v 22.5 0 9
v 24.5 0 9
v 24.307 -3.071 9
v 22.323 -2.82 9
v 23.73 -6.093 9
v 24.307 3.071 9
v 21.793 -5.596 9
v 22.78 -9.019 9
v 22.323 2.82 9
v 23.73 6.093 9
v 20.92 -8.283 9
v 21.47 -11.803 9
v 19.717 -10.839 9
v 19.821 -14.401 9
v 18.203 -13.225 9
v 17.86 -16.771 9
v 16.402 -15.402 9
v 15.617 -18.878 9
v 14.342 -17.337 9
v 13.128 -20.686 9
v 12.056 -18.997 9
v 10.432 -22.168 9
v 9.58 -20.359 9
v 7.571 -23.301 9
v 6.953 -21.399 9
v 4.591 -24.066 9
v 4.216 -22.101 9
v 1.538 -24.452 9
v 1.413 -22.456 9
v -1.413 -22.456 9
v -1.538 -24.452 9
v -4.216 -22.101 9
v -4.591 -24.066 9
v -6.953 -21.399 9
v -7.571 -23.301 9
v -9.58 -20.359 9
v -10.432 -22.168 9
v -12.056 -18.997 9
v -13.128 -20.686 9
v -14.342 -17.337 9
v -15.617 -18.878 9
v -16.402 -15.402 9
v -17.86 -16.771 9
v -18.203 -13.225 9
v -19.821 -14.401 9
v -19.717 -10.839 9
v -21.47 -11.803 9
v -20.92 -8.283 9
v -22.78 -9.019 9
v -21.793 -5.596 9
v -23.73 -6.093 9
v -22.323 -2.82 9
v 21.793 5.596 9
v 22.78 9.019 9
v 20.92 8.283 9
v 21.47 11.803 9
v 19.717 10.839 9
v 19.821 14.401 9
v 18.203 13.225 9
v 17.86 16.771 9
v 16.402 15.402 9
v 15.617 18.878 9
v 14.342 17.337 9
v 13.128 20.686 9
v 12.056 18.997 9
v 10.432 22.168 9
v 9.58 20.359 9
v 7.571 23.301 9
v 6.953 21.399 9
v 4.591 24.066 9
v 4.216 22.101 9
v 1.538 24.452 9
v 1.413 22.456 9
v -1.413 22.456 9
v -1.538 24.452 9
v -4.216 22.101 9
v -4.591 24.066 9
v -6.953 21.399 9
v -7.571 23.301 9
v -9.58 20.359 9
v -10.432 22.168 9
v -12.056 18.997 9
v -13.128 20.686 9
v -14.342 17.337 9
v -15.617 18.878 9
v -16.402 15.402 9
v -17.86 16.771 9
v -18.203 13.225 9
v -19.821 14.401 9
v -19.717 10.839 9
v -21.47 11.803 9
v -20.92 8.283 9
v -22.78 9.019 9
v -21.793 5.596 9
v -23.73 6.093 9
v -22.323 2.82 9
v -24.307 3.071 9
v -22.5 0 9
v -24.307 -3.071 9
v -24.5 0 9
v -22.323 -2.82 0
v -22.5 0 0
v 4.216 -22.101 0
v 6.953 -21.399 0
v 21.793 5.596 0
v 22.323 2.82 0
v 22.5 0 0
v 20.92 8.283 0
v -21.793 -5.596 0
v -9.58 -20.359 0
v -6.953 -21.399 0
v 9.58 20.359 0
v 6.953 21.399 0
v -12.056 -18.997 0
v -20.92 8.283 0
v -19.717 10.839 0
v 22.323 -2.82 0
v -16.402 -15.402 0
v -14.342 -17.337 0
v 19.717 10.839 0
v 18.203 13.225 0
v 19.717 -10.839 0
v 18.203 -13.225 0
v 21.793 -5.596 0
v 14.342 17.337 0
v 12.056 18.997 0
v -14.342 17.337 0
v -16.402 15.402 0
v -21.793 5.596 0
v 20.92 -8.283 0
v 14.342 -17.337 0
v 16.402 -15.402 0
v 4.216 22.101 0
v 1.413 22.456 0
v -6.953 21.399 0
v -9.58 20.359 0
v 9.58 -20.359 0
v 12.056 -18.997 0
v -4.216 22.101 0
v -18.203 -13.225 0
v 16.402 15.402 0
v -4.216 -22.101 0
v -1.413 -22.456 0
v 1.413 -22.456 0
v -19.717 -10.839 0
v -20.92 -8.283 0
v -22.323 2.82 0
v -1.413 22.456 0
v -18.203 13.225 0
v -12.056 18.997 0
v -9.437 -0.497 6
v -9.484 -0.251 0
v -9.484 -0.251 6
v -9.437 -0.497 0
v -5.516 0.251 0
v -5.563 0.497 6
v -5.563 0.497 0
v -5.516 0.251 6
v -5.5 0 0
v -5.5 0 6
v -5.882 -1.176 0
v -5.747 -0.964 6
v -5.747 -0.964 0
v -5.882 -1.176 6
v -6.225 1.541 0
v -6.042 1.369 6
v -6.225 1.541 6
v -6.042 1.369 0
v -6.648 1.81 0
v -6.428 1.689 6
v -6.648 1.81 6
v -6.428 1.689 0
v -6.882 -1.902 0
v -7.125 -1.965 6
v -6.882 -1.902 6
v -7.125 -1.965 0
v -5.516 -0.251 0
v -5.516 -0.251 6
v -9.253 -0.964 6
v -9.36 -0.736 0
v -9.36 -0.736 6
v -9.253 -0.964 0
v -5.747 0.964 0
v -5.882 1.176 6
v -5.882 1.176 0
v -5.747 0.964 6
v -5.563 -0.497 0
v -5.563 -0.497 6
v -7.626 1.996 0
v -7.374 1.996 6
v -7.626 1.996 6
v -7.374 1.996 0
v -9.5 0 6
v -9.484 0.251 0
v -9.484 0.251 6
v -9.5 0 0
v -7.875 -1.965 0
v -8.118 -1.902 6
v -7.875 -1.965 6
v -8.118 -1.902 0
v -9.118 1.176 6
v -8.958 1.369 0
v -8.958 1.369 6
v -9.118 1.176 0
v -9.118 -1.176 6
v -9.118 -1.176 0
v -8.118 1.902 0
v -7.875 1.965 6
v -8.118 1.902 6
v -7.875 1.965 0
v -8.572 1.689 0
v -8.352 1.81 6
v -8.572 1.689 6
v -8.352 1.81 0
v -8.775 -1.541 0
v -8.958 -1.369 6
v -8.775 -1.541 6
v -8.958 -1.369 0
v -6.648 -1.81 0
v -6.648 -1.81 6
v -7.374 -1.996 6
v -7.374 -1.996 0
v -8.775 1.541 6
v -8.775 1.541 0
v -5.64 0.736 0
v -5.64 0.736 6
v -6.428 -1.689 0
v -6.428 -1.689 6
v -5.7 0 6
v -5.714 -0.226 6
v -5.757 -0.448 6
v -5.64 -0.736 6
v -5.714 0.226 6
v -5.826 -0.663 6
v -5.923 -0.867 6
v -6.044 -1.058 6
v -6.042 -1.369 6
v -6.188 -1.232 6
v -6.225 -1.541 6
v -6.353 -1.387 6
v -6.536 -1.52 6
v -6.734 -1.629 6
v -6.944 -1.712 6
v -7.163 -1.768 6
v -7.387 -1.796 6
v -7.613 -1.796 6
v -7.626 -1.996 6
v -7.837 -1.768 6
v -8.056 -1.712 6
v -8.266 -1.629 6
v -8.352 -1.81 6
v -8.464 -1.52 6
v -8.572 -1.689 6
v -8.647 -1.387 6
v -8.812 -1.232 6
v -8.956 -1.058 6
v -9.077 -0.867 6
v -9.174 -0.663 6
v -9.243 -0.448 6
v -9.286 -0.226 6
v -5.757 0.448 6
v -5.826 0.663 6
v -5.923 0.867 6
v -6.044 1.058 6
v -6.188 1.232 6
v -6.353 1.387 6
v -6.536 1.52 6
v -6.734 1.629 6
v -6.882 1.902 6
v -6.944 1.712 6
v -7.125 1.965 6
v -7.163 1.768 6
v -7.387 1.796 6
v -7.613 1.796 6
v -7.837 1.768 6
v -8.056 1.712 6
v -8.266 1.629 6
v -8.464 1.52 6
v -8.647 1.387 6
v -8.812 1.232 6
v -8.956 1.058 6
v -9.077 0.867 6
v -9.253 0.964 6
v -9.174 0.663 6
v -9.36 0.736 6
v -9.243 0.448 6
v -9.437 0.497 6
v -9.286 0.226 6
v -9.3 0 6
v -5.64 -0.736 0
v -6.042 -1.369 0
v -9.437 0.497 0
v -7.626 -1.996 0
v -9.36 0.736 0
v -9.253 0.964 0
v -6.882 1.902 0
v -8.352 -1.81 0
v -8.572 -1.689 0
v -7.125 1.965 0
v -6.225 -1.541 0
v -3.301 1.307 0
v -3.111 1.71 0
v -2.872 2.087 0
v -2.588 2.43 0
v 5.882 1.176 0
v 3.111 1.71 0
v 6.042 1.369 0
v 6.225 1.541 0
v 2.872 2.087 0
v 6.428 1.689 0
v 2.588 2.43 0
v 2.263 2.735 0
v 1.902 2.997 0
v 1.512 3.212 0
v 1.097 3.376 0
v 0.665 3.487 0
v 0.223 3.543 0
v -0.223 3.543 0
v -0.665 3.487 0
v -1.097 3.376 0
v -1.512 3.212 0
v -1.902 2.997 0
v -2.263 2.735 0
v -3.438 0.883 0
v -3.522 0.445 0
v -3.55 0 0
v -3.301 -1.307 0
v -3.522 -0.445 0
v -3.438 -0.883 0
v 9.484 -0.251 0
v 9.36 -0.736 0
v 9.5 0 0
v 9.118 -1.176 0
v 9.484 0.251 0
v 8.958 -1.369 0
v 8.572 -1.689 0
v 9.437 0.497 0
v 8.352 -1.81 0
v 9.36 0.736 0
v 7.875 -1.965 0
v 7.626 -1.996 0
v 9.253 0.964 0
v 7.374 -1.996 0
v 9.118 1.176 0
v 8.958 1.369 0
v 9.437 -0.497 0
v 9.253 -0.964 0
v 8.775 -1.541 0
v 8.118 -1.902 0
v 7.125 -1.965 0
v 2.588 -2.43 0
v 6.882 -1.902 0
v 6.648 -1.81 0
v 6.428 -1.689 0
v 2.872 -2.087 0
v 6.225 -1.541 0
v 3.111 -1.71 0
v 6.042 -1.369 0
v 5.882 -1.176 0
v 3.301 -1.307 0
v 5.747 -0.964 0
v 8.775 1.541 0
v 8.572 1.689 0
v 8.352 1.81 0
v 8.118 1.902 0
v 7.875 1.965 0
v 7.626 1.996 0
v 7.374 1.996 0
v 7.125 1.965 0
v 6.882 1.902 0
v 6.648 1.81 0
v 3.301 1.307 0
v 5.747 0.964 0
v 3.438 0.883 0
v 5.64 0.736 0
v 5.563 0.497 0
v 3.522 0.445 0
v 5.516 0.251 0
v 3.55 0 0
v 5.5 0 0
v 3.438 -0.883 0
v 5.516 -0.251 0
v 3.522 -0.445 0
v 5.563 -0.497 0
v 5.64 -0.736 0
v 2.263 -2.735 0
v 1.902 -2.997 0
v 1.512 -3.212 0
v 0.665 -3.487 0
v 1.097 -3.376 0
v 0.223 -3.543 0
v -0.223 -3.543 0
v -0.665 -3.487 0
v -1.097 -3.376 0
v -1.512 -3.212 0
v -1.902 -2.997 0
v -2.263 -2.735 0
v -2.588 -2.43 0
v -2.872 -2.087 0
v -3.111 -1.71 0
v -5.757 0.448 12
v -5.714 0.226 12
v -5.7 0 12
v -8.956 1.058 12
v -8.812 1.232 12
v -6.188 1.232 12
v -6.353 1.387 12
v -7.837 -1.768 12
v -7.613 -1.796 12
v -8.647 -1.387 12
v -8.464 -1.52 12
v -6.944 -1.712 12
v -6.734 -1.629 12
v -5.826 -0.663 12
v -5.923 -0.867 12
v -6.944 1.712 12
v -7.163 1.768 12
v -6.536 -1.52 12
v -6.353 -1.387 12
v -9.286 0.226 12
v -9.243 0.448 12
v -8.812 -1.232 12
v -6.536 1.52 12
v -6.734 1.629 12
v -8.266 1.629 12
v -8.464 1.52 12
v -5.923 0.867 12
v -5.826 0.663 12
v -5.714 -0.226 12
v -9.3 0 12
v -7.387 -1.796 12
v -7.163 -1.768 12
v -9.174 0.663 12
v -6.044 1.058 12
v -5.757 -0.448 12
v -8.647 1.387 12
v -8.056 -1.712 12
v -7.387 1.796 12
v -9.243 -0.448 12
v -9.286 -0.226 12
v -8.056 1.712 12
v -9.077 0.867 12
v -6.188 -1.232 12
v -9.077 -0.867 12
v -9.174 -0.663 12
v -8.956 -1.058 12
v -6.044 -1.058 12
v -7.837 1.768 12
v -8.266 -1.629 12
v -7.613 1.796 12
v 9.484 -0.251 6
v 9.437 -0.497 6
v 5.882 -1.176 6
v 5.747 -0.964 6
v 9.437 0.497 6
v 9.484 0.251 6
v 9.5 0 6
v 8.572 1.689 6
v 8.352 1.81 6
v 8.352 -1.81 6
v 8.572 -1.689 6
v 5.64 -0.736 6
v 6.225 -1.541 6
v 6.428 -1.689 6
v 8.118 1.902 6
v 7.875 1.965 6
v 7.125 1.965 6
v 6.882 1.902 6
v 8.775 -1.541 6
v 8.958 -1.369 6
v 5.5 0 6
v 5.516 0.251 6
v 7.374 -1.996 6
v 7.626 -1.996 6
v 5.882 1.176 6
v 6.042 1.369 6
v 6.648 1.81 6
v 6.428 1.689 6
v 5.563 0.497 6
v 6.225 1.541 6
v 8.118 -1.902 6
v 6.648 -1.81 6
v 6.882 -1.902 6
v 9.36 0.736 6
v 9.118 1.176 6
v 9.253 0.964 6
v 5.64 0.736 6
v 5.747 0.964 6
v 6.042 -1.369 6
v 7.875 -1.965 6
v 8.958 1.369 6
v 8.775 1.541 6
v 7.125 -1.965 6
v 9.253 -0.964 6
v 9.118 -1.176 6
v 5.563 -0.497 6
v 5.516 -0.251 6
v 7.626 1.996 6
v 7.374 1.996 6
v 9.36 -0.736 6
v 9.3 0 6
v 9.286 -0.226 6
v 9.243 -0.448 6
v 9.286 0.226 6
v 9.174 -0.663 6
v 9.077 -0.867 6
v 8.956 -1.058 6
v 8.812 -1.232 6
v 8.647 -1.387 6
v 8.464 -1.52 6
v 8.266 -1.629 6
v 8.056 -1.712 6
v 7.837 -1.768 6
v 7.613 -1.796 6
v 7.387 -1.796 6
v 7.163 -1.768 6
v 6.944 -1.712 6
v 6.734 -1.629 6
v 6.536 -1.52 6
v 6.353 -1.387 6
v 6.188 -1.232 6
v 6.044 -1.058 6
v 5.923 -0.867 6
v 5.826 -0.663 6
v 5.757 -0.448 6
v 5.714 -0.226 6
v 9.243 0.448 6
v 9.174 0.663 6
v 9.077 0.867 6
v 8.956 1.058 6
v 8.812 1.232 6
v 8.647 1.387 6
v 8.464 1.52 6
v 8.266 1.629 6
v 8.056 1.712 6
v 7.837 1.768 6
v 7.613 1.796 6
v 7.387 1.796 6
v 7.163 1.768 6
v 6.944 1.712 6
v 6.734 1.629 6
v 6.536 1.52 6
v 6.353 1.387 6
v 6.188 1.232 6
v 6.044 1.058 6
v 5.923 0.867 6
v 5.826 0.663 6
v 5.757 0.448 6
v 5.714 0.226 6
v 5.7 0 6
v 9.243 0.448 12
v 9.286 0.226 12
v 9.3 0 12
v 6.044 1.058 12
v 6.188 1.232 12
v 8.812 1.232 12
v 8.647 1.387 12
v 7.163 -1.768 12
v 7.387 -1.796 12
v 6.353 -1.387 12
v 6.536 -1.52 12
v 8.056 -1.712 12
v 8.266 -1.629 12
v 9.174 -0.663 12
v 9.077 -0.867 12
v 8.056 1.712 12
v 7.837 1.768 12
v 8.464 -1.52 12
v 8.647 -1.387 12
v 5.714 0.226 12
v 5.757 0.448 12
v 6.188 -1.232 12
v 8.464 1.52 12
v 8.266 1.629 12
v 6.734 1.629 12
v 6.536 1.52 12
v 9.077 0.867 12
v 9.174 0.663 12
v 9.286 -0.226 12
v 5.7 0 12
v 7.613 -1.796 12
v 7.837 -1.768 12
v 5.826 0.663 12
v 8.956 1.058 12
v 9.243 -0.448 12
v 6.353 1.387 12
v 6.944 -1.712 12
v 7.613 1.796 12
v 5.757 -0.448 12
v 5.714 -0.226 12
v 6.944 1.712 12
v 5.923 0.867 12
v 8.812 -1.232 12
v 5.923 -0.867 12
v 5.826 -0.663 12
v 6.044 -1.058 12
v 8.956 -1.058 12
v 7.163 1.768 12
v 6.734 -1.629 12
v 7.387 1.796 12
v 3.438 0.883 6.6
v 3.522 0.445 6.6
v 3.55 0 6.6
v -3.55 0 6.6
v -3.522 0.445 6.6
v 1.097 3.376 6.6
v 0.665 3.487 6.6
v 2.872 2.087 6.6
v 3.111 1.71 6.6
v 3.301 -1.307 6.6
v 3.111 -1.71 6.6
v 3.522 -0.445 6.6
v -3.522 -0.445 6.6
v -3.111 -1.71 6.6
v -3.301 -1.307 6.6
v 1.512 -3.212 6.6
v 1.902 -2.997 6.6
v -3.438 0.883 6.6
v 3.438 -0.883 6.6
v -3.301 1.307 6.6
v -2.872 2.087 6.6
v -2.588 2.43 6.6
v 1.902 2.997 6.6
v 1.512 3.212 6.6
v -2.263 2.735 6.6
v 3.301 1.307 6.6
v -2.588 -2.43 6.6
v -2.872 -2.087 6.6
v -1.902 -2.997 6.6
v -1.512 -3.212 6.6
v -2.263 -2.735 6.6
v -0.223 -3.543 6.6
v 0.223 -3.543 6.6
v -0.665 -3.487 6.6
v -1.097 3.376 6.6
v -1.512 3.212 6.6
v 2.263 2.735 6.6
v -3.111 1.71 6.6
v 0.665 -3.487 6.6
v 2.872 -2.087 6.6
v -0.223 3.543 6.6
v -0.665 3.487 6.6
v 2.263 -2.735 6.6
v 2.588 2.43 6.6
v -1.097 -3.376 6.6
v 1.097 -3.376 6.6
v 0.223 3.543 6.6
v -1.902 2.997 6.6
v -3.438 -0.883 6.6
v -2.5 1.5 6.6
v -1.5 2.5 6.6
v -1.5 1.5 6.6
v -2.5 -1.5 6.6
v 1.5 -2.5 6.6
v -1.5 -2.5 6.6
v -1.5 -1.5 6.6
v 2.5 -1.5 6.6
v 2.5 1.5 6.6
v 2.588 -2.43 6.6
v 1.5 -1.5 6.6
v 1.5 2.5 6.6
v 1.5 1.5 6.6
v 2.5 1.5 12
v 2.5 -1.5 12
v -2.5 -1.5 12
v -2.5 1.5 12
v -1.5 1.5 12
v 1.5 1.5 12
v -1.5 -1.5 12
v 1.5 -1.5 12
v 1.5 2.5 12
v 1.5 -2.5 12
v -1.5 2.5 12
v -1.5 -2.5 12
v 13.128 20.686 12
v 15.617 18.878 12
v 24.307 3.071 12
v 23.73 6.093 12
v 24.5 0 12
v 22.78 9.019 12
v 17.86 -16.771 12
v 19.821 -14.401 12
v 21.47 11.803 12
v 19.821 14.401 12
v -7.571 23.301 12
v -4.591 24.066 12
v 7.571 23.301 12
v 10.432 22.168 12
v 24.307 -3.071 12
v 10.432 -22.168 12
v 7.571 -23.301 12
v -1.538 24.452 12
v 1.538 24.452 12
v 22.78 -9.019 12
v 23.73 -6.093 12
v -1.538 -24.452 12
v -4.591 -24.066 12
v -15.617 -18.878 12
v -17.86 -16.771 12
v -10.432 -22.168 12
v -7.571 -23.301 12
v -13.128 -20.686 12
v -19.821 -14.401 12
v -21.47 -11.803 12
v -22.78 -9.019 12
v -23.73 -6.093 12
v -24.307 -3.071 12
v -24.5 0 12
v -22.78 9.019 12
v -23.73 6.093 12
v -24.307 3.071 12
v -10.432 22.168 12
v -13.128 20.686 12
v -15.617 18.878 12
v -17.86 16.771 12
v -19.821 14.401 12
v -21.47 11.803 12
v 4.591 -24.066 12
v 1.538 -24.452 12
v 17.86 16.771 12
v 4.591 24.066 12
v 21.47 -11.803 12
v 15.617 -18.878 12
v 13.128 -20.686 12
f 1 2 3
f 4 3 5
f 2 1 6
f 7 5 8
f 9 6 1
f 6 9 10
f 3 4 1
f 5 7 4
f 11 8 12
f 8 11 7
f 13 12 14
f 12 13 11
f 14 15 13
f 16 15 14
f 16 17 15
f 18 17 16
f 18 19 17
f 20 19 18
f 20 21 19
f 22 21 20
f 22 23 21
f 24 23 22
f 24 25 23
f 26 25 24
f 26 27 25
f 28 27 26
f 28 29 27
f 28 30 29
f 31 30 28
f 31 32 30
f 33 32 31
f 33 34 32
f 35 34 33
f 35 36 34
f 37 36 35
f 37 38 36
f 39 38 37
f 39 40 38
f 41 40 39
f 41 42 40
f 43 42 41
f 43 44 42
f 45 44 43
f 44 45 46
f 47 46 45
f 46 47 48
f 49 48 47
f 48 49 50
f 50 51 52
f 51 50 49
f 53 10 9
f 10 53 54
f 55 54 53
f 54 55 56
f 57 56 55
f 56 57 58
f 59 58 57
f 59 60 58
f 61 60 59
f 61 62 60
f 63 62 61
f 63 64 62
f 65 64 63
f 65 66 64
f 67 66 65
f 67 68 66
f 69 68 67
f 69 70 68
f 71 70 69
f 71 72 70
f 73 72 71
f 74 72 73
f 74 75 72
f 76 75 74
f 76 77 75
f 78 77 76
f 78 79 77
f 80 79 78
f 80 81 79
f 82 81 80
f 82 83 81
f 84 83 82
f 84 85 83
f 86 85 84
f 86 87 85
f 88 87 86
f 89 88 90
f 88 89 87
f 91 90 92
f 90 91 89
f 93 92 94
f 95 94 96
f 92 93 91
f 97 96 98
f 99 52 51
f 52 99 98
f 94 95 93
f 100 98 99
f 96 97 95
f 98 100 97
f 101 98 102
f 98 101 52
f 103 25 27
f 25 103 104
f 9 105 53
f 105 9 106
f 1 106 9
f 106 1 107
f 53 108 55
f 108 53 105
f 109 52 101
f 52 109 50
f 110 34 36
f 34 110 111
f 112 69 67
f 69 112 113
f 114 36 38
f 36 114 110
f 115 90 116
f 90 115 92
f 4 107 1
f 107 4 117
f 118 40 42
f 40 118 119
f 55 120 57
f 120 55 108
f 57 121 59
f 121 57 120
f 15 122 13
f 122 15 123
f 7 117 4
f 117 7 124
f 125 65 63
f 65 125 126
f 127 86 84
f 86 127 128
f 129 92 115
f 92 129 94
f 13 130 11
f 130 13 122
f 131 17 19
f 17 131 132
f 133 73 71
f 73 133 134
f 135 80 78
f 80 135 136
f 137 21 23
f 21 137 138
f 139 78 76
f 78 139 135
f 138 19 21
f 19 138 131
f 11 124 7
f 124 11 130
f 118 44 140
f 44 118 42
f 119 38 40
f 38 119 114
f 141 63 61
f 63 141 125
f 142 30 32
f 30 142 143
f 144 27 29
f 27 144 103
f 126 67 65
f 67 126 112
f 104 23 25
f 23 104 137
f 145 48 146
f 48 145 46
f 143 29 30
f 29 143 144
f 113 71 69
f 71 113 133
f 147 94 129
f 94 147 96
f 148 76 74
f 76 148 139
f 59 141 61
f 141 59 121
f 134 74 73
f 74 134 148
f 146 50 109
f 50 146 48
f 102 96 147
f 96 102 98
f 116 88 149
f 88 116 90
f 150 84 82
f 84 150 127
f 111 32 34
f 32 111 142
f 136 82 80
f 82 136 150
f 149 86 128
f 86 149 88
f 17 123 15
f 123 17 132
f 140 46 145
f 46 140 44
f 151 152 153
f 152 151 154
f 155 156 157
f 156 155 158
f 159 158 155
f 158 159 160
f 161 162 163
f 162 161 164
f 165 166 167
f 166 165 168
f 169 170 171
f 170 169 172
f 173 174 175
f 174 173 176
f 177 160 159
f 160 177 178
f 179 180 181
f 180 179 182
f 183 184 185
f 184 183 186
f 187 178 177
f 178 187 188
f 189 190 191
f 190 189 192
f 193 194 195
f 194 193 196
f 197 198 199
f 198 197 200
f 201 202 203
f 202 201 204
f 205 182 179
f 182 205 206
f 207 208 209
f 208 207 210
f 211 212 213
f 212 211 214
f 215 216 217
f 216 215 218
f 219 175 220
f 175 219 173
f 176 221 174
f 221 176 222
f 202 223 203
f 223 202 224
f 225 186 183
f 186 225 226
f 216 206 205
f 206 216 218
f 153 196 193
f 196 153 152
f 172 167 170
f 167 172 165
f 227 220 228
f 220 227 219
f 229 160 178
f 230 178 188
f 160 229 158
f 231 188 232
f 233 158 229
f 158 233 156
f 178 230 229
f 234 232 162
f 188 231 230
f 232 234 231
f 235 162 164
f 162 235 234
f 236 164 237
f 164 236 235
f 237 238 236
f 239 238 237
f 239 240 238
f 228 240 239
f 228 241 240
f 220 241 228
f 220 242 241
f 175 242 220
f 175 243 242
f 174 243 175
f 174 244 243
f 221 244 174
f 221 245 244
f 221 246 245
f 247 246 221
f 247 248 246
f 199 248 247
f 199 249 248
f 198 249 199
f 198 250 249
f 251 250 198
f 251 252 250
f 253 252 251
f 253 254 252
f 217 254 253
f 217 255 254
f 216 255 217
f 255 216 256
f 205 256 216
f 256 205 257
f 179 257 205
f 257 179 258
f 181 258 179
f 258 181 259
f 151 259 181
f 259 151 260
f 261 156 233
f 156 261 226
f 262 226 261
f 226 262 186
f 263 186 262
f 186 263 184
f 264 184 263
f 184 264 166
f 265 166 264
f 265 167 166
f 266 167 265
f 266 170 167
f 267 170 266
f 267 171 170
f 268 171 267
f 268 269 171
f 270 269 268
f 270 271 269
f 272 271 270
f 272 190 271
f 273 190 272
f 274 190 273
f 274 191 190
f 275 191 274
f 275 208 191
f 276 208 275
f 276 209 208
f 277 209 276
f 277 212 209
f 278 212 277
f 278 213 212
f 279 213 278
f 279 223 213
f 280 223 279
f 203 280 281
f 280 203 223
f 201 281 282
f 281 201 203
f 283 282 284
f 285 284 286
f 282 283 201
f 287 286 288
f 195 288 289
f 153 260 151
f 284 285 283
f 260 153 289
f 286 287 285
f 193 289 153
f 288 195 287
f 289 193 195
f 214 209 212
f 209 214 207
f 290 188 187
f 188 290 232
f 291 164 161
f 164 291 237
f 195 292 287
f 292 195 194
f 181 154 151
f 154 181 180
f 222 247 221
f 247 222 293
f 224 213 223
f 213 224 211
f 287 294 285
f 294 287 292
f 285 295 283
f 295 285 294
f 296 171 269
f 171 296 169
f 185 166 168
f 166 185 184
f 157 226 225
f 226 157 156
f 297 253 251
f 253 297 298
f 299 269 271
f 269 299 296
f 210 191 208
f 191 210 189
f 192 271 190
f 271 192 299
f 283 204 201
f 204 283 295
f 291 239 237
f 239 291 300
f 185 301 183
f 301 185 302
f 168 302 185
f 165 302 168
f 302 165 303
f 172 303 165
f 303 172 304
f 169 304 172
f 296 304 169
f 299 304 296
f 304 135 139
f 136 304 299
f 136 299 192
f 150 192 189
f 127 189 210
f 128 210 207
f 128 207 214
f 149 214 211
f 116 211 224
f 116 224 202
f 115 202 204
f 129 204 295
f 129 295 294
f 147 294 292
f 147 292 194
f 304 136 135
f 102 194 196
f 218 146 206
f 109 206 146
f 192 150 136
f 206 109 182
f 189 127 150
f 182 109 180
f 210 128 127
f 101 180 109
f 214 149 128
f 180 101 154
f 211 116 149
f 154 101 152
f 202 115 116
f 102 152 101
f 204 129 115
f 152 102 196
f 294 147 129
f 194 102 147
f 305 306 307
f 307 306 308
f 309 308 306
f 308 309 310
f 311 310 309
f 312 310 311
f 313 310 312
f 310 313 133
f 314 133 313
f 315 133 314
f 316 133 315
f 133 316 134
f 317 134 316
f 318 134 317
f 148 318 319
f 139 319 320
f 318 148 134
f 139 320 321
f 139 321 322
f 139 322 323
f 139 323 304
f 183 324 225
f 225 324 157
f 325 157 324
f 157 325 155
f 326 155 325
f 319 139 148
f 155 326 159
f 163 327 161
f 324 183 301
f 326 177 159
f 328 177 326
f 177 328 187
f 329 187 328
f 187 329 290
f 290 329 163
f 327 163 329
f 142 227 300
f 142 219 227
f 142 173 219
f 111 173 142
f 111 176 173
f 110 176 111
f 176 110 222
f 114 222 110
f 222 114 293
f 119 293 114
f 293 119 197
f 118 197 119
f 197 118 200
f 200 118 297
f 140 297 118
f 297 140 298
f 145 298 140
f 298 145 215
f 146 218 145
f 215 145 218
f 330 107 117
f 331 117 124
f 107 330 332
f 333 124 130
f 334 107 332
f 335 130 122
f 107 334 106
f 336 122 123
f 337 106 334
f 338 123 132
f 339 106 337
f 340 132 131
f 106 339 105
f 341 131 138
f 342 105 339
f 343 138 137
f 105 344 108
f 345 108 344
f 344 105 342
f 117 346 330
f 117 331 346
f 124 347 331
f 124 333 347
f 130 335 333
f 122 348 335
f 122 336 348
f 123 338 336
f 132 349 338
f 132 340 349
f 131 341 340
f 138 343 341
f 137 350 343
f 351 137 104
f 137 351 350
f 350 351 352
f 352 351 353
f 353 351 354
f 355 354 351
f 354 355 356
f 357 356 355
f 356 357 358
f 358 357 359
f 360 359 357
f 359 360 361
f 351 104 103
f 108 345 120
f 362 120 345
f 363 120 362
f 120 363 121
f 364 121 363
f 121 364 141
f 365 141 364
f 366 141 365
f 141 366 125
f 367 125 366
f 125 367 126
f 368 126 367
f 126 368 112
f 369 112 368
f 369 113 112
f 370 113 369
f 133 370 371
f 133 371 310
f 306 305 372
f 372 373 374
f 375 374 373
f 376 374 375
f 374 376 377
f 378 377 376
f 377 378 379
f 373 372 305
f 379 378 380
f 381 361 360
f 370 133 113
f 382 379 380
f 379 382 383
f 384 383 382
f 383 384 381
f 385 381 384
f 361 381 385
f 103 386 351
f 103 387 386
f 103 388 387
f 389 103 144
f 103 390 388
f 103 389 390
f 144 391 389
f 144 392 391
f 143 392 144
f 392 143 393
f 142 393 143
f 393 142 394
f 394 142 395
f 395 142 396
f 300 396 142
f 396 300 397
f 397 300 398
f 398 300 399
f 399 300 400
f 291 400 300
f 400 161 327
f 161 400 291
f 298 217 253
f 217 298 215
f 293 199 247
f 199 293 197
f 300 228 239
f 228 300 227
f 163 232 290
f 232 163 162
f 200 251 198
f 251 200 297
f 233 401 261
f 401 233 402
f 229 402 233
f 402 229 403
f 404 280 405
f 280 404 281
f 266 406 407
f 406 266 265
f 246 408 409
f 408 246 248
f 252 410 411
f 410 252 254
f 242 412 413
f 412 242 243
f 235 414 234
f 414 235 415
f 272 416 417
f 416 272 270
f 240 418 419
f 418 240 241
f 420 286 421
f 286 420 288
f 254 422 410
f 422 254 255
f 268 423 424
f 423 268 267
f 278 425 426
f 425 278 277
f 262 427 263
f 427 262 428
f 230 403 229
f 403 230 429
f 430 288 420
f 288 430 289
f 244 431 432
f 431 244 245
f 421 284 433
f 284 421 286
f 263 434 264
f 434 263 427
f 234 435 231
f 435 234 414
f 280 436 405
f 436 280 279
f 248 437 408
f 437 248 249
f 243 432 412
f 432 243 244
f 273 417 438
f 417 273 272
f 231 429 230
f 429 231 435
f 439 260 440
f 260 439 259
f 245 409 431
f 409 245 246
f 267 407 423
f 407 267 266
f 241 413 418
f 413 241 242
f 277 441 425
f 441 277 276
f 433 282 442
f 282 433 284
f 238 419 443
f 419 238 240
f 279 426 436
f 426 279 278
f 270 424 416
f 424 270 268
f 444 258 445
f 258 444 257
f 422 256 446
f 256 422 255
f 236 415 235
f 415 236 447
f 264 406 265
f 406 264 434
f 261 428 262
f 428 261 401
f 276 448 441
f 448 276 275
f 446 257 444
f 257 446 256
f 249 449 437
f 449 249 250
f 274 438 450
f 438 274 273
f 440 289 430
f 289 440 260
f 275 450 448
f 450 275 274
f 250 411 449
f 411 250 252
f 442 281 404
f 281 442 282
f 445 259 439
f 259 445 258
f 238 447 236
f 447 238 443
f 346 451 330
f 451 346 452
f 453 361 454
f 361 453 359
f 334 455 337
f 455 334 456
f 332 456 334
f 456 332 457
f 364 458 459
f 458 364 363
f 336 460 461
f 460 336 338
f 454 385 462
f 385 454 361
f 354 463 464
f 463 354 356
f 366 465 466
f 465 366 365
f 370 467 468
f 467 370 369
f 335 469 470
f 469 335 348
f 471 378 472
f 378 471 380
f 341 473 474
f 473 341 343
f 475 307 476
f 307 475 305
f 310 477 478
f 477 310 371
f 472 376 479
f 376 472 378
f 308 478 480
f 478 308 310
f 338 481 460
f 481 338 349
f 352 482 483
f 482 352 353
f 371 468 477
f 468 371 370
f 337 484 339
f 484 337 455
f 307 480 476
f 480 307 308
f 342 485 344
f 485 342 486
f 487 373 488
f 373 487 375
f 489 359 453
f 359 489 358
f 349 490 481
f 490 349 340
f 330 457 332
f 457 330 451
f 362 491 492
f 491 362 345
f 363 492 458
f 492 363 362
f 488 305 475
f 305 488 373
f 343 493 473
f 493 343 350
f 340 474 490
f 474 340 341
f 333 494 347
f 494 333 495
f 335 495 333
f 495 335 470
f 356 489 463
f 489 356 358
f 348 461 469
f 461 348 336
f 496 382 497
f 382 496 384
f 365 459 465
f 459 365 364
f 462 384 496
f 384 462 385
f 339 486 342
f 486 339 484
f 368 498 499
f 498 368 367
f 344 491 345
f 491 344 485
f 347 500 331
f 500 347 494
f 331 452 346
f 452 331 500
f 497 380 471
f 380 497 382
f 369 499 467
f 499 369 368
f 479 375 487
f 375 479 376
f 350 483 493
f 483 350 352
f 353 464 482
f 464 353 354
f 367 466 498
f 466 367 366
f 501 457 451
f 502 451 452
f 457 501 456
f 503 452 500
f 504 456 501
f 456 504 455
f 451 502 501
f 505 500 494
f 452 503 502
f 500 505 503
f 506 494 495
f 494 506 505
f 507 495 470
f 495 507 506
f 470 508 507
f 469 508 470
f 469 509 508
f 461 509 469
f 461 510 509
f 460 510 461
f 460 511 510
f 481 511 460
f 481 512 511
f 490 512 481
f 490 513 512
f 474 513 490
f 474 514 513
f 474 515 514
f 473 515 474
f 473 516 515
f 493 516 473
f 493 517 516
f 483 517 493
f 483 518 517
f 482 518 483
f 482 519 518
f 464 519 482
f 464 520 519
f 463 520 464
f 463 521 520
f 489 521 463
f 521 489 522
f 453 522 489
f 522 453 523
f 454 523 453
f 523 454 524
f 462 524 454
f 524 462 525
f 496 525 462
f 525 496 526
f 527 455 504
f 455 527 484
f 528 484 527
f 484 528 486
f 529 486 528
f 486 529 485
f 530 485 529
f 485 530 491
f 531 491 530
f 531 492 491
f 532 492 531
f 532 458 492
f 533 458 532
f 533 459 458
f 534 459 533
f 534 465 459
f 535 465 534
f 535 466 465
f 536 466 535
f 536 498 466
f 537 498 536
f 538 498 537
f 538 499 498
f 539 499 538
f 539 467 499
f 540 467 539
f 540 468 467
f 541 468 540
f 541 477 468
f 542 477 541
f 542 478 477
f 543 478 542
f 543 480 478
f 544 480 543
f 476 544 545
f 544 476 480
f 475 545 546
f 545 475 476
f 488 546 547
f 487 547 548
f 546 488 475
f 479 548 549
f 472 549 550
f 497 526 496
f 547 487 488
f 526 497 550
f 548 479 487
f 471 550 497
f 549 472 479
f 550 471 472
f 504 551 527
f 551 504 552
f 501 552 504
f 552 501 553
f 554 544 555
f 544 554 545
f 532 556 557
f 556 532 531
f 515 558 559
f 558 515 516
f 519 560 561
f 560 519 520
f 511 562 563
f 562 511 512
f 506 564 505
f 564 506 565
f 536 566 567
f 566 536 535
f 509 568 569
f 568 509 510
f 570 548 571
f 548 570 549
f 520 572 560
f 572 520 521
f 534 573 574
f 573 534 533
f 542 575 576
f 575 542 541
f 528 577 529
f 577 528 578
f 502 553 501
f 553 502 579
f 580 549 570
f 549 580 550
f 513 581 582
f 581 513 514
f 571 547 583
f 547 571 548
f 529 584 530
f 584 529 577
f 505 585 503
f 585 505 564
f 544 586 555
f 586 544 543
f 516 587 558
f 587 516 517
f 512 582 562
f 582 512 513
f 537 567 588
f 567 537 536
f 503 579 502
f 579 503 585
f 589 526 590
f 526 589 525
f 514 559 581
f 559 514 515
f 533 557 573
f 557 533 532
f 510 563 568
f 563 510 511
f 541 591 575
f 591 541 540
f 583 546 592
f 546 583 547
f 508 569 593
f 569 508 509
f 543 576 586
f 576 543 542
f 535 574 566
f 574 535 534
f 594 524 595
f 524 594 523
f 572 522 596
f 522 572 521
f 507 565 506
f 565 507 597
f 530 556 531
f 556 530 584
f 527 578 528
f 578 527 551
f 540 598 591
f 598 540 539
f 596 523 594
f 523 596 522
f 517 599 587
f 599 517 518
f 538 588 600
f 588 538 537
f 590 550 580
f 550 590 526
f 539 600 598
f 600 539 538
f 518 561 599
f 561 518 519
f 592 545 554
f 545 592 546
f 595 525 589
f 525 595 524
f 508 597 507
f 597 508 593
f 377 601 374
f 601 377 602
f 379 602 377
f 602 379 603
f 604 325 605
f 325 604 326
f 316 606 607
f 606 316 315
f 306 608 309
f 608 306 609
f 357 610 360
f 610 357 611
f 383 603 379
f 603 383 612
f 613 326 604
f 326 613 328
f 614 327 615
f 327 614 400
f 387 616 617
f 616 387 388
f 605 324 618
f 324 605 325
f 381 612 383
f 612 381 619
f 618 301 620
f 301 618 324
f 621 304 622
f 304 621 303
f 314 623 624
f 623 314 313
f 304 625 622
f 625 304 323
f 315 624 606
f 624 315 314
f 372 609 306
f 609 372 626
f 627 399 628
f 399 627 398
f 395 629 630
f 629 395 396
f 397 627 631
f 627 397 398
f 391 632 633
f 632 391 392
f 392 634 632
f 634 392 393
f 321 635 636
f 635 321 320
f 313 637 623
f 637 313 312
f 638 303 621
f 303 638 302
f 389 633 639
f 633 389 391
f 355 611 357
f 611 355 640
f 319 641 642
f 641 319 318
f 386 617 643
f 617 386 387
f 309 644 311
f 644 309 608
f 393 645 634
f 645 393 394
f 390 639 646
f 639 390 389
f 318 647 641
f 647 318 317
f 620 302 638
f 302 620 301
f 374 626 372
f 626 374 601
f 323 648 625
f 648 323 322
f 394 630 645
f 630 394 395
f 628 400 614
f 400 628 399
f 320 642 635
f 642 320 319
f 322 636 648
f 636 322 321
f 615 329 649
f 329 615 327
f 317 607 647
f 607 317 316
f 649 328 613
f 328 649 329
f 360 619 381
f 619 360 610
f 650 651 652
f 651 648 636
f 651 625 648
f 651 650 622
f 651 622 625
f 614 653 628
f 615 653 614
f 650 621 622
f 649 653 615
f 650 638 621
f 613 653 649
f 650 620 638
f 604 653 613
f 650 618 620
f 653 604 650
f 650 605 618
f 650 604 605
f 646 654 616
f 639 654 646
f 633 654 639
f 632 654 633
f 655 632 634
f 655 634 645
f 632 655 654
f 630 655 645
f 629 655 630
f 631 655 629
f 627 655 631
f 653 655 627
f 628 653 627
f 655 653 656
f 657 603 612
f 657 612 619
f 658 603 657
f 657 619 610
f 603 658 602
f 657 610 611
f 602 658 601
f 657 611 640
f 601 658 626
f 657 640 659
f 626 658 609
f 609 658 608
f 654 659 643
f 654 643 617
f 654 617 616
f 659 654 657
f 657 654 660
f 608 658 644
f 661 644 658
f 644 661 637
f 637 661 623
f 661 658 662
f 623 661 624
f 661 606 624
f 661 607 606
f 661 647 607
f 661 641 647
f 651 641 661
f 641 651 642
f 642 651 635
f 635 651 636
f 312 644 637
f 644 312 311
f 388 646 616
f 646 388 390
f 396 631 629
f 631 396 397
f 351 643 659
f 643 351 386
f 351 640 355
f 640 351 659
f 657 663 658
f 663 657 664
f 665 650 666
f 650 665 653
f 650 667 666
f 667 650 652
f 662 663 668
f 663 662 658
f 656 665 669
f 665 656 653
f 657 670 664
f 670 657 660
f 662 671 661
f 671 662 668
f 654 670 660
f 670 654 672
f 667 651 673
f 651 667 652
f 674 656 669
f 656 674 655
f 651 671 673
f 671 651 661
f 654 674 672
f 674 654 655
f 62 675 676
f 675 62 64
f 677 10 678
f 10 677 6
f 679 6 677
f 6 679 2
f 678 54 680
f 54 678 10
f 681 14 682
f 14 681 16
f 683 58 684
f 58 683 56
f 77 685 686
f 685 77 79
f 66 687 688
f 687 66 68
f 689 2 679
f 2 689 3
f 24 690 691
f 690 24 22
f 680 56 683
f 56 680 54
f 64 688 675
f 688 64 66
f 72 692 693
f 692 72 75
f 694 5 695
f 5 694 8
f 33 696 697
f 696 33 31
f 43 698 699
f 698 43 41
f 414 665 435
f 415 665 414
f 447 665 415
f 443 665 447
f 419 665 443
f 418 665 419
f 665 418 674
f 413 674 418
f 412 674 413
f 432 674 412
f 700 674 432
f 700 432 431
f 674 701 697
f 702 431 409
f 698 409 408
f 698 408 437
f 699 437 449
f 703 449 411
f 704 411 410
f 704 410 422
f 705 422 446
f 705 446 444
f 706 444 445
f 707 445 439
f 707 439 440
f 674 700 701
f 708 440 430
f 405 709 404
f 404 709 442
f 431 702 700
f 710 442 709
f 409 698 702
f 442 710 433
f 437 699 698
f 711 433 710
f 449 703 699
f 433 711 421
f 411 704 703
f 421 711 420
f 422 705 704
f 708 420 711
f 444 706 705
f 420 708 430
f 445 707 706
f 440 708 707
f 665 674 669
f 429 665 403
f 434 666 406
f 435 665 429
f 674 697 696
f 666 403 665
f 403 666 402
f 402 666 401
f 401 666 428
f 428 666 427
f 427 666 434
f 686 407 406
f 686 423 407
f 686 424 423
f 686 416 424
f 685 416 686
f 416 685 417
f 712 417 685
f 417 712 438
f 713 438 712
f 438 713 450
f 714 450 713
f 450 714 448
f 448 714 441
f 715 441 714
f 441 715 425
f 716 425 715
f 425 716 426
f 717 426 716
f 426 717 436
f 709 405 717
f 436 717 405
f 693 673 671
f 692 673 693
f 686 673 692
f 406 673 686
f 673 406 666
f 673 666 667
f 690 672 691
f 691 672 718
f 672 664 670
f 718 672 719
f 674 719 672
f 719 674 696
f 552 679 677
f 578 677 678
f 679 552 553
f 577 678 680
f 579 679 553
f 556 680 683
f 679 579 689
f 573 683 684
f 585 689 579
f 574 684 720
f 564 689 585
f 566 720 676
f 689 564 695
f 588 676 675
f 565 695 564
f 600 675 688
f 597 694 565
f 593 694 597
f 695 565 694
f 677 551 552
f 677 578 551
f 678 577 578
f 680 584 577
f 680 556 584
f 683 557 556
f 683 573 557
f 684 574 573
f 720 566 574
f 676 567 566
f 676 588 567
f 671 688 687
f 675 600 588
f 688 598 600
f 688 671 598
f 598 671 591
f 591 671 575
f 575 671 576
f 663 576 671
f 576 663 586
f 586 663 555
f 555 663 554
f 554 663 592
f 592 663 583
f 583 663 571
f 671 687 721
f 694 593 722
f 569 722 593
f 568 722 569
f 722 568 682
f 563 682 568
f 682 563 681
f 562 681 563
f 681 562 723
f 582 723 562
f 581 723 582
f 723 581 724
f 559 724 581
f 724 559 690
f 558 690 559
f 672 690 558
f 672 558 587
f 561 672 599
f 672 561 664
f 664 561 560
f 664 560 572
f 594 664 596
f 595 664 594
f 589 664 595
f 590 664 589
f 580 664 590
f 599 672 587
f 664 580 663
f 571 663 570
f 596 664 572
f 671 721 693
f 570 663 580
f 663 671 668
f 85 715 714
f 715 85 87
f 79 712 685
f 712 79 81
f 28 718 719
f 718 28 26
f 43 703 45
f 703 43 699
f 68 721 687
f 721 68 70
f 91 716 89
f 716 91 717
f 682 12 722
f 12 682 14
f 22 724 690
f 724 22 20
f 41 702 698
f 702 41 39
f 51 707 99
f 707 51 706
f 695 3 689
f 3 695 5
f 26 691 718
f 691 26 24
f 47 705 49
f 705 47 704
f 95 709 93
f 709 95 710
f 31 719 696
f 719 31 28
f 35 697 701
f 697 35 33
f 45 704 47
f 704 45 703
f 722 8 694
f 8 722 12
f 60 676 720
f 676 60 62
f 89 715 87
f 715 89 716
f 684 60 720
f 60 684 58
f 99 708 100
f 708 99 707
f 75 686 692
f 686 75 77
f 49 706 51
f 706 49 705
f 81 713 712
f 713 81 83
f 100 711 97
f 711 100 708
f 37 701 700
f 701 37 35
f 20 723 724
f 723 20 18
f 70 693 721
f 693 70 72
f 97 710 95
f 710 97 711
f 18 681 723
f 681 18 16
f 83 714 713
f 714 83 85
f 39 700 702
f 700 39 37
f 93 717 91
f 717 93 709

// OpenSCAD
$fn = 50;

difference() {
	union() {
		translate(v = [0, 0, 0]) {
			rotate(a = [0, 0, 0]) {
				difference() {
					union() {
						translate(v = [0, 0, 6.0]) {
							rotate(a = [0, 0, 0]) {
								difference() {
									union() {
										translate(v = [0, 0, -6.0]) {
											cylinder(h = 12, r = 24.5);
										}
									}
									union() {
										translate(v = [0, 0, 0]) {
											rotate(a = [0, 0, 0]) {
												difference() {
													union() {
														translate(v = [0, 0, -3.0]) {
															cylinder(h = 6, r = 27.7);
														}
													}
													union() {
														translate(v = [0, 0, -3.01]) {
															cylinder(h = 6.02, r = 22.5);
														}
													}
												}
											}
										}
										translate(v = [0, 0, -3]) {
											rotate(a = [0, 0, 0]) {
												difference() {
													union() {
														translate(v = [0, 0, -3.0]) {
															cylinder(h = 6, r = 27.7);
														}
													}
													union() {
														translate(v = [0, 0, -3.01]) {
															cylinder(h = 6.02, r = 22.5);
														}
													}
												}
											}
										}
										translate(v = [0, 0, -6]) {
											rotate(a = [0, 0, 0]) {
												difference() {
													union() {
														translate(v = [0, 0, -3.0]) {
															cylinder(h = 6, r = 27.7);
														}
													}
													union() {
														translate(v = [0, 0, -3.01]) {
															cylinder(h = 6.02, r = 22.5);
														}
													}
												}
											}
										}
										translate(v = [0, 0, 0]) {
											rotate(a = [0, 0, 0]) {
												difference() {
													union() {
														translate(v = [0, 0, -21.0]) {
															cylinder(h = 42, r = 25.6);
														}
													}
													union() {
														translate(v = [0, 0, -21.01]) {
															cylinder(h = 42.02, r = 24.6);
														}
													}
												}
											}
										}
										translate(v = [-30.0, -30.0, -100.0]) {
											cylinder(h = 200, r = 3.25);
										}
										translate(v = [-30.0, -15.0, -100.0]) {
											cylinder(h = 200, r = 3.25);
										}
										translate(v = [-30.0, 15.0, -100.0]) {
											cylinder(h = 200, r = 3.25);
										}
										translate(v = [-30.0, 30.0, -100.0]) {
											cylinder(h = 200, r = 3.25);
										}
										translate(v = [-15.0, -30.0, -100.0]) {
											cylinder(h = 200, r = 3.25);
										}
										translate(v = [-15.0, 30.0, -100.0]) {
											cylinder(h = 200, r = 3.25);
										}
										translate(v = [15.0, -30.0, -100.0]) {
											cylinder(h = 200, r = 3.25);
										}
										translate(v = [15.0, 30.0, -100.0]) {
											cylinder(h = 200, r = 3.25);
										}
										translate(v = [30.0, -30.0, -100.0]) {
											cylinder(h = 200, r = 3.25);
										}
										translate(v = [30.0, -15.0, -100.0]) {
											cylinder(h = 200, r = 3.25);
										}
										translate(v = [30.0, 15.0, -100.0]) {
											cylinder(h = 200, r = 3.25);
										}
										translate(v = [30.0, 30.0, -100.0]) {
											cylinder(h = 200, r = 3.25);
										}
										translate(v = [-7.5, 0, -6.0]) {
											cylinder(h = 6, r = 2.0);
										}
										translate(v = [-7.5, 0, -7.0]) {
											cylinder(h = 14, r = 1.8);
										}
										translate(v = [7.5, 0, -6.0]) {
											cylinder(h = 6, r = 2.0);
										}
										translate(v = [7.5, 0, -7.0]) {
											cylinder(h = 14, r = 1.8);
										}
										translate(v = [0, 0, -6.000000000000001]) {
											cylinder(h = 6.6, r = 3.55);
										}
										translate(v = [-2.5, -1.5, -7.0]) {
											cube(size = [5, 3, 14]);
										}
										translate(v = [-1.5, -2.5, -7.0]) {
											cube(size = [3, 5, 14]);
										}
									}
								}
							}
						}
					}
					union();
				}
			}
		}
	}
	union();
}
